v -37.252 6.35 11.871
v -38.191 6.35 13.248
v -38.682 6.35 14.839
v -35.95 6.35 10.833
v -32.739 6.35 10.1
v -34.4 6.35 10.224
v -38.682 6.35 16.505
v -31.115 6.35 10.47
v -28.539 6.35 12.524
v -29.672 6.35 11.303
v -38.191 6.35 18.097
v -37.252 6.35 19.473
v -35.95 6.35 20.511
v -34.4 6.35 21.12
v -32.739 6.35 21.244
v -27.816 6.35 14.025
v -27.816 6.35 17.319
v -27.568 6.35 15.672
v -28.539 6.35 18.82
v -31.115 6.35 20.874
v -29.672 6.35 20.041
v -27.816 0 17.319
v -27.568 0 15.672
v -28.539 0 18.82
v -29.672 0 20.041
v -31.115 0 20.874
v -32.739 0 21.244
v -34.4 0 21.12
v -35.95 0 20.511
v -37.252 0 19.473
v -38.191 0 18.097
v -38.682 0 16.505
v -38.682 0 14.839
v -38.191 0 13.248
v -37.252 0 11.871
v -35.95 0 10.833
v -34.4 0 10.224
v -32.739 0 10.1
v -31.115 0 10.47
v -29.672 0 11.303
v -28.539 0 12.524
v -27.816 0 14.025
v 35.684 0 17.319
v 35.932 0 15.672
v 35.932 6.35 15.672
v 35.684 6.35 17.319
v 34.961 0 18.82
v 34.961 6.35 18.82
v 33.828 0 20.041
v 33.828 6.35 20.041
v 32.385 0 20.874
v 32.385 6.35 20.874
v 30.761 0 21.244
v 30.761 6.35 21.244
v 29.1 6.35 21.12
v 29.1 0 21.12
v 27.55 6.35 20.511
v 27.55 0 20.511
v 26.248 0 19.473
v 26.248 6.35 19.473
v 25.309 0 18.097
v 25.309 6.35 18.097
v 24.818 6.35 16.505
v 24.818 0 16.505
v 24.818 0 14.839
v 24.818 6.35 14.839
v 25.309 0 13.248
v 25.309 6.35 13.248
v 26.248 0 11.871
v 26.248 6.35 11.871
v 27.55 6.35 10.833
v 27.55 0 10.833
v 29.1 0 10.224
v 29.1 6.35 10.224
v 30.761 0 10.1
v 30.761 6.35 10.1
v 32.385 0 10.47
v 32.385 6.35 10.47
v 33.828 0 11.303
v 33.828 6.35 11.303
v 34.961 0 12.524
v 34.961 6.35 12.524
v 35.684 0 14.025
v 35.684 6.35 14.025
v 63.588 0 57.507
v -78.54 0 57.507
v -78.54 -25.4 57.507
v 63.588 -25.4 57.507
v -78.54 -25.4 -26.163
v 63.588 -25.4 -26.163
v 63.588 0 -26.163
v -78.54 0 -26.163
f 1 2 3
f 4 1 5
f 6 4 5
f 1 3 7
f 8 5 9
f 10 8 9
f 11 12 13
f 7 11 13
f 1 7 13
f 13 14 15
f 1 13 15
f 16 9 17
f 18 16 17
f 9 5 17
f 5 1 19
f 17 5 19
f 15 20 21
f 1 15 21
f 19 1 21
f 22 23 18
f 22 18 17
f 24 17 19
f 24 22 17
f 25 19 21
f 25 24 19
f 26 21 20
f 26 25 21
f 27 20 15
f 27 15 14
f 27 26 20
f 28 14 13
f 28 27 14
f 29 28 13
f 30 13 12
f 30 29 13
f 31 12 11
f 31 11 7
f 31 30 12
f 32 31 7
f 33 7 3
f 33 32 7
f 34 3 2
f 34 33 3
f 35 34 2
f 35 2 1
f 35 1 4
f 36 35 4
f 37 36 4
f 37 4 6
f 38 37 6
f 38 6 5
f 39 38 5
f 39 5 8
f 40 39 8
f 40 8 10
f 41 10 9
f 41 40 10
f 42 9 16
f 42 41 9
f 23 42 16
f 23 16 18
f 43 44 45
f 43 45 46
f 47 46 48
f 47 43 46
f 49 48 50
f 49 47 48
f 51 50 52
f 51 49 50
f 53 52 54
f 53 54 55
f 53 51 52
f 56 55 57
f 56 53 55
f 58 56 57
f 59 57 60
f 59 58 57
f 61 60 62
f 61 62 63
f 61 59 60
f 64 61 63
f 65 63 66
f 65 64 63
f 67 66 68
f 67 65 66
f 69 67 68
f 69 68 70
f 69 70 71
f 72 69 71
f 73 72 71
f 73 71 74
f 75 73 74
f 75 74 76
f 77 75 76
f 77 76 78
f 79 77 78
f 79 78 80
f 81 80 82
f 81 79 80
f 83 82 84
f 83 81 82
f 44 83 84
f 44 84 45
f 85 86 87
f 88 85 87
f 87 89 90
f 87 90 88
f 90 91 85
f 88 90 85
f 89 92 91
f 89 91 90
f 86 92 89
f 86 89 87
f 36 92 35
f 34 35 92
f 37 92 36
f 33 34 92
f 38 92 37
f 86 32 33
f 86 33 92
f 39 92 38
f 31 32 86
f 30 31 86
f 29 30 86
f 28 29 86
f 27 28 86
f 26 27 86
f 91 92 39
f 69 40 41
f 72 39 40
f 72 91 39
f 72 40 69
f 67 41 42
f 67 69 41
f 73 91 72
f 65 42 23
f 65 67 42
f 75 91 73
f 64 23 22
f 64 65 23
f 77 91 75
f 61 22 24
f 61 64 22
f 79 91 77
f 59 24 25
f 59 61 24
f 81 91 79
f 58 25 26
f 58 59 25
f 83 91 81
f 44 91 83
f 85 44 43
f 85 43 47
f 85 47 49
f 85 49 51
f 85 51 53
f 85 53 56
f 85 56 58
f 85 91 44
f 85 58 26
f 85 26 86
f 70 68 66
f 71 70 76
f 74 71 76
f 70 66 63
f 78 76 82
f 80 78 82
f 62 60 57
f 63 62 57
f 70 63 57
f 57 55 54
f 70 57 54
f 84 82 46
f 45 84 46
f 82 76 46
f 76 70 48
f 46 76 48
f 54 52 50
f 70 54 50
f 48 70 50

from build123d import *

# Parameters (mm, degrees)
F0_W     = 116.7279371016
F0_H     = 83.6705883693
F0_R     = 5.588
F1_DEPTH = 25.4
F2_DEPTH = 6.35
F3_DEPTH = 25.4


with BuildPart() as f1:
    # F0 (on Front) → F1 (new body)
    with BuildSketch(Plane.XZ):
        with Locations((5.224019289, 15.672063455)):
            Rectangle(F0_W, F0_H)
        with Locations((-33.1561258105, 15.672063455)):
            Circle(F0_R, mode=Mode.SUBTRACT)
        with Locations((30.3438741895, 15.672063455)):
            Circle(F0_R, mode=Mode.SUBTRACT)
        with Locations((-33.1561258105, 15.672063455)):
            Circle(F0_R)
        with Locations((30.3438741895, 15.672063455)):
            Circle(F0_R)
    extrude(amount=F1_DEPTH)

    # F0 (on Front) → F2 (join)
    with BuildSketch(Plane.XZ):
        with Locations((30.3438741895, 15.672063455)):
            Circle(F0_R)
        with Locations((-33.1561258105, 15.672063455)):
            Circle(F0_R)
    extrude(amount=-F2_DEPTH)

    # F3 (add): a face of the model
    f3_faces = [f1.faces().sort_by_distance(p)[0] for p in [
        (-53.1399492618, -12.7, 15.672063455),
    ]]
    extrude(f3_faces, amount=F3_DEPTH)


solid = f1.part
